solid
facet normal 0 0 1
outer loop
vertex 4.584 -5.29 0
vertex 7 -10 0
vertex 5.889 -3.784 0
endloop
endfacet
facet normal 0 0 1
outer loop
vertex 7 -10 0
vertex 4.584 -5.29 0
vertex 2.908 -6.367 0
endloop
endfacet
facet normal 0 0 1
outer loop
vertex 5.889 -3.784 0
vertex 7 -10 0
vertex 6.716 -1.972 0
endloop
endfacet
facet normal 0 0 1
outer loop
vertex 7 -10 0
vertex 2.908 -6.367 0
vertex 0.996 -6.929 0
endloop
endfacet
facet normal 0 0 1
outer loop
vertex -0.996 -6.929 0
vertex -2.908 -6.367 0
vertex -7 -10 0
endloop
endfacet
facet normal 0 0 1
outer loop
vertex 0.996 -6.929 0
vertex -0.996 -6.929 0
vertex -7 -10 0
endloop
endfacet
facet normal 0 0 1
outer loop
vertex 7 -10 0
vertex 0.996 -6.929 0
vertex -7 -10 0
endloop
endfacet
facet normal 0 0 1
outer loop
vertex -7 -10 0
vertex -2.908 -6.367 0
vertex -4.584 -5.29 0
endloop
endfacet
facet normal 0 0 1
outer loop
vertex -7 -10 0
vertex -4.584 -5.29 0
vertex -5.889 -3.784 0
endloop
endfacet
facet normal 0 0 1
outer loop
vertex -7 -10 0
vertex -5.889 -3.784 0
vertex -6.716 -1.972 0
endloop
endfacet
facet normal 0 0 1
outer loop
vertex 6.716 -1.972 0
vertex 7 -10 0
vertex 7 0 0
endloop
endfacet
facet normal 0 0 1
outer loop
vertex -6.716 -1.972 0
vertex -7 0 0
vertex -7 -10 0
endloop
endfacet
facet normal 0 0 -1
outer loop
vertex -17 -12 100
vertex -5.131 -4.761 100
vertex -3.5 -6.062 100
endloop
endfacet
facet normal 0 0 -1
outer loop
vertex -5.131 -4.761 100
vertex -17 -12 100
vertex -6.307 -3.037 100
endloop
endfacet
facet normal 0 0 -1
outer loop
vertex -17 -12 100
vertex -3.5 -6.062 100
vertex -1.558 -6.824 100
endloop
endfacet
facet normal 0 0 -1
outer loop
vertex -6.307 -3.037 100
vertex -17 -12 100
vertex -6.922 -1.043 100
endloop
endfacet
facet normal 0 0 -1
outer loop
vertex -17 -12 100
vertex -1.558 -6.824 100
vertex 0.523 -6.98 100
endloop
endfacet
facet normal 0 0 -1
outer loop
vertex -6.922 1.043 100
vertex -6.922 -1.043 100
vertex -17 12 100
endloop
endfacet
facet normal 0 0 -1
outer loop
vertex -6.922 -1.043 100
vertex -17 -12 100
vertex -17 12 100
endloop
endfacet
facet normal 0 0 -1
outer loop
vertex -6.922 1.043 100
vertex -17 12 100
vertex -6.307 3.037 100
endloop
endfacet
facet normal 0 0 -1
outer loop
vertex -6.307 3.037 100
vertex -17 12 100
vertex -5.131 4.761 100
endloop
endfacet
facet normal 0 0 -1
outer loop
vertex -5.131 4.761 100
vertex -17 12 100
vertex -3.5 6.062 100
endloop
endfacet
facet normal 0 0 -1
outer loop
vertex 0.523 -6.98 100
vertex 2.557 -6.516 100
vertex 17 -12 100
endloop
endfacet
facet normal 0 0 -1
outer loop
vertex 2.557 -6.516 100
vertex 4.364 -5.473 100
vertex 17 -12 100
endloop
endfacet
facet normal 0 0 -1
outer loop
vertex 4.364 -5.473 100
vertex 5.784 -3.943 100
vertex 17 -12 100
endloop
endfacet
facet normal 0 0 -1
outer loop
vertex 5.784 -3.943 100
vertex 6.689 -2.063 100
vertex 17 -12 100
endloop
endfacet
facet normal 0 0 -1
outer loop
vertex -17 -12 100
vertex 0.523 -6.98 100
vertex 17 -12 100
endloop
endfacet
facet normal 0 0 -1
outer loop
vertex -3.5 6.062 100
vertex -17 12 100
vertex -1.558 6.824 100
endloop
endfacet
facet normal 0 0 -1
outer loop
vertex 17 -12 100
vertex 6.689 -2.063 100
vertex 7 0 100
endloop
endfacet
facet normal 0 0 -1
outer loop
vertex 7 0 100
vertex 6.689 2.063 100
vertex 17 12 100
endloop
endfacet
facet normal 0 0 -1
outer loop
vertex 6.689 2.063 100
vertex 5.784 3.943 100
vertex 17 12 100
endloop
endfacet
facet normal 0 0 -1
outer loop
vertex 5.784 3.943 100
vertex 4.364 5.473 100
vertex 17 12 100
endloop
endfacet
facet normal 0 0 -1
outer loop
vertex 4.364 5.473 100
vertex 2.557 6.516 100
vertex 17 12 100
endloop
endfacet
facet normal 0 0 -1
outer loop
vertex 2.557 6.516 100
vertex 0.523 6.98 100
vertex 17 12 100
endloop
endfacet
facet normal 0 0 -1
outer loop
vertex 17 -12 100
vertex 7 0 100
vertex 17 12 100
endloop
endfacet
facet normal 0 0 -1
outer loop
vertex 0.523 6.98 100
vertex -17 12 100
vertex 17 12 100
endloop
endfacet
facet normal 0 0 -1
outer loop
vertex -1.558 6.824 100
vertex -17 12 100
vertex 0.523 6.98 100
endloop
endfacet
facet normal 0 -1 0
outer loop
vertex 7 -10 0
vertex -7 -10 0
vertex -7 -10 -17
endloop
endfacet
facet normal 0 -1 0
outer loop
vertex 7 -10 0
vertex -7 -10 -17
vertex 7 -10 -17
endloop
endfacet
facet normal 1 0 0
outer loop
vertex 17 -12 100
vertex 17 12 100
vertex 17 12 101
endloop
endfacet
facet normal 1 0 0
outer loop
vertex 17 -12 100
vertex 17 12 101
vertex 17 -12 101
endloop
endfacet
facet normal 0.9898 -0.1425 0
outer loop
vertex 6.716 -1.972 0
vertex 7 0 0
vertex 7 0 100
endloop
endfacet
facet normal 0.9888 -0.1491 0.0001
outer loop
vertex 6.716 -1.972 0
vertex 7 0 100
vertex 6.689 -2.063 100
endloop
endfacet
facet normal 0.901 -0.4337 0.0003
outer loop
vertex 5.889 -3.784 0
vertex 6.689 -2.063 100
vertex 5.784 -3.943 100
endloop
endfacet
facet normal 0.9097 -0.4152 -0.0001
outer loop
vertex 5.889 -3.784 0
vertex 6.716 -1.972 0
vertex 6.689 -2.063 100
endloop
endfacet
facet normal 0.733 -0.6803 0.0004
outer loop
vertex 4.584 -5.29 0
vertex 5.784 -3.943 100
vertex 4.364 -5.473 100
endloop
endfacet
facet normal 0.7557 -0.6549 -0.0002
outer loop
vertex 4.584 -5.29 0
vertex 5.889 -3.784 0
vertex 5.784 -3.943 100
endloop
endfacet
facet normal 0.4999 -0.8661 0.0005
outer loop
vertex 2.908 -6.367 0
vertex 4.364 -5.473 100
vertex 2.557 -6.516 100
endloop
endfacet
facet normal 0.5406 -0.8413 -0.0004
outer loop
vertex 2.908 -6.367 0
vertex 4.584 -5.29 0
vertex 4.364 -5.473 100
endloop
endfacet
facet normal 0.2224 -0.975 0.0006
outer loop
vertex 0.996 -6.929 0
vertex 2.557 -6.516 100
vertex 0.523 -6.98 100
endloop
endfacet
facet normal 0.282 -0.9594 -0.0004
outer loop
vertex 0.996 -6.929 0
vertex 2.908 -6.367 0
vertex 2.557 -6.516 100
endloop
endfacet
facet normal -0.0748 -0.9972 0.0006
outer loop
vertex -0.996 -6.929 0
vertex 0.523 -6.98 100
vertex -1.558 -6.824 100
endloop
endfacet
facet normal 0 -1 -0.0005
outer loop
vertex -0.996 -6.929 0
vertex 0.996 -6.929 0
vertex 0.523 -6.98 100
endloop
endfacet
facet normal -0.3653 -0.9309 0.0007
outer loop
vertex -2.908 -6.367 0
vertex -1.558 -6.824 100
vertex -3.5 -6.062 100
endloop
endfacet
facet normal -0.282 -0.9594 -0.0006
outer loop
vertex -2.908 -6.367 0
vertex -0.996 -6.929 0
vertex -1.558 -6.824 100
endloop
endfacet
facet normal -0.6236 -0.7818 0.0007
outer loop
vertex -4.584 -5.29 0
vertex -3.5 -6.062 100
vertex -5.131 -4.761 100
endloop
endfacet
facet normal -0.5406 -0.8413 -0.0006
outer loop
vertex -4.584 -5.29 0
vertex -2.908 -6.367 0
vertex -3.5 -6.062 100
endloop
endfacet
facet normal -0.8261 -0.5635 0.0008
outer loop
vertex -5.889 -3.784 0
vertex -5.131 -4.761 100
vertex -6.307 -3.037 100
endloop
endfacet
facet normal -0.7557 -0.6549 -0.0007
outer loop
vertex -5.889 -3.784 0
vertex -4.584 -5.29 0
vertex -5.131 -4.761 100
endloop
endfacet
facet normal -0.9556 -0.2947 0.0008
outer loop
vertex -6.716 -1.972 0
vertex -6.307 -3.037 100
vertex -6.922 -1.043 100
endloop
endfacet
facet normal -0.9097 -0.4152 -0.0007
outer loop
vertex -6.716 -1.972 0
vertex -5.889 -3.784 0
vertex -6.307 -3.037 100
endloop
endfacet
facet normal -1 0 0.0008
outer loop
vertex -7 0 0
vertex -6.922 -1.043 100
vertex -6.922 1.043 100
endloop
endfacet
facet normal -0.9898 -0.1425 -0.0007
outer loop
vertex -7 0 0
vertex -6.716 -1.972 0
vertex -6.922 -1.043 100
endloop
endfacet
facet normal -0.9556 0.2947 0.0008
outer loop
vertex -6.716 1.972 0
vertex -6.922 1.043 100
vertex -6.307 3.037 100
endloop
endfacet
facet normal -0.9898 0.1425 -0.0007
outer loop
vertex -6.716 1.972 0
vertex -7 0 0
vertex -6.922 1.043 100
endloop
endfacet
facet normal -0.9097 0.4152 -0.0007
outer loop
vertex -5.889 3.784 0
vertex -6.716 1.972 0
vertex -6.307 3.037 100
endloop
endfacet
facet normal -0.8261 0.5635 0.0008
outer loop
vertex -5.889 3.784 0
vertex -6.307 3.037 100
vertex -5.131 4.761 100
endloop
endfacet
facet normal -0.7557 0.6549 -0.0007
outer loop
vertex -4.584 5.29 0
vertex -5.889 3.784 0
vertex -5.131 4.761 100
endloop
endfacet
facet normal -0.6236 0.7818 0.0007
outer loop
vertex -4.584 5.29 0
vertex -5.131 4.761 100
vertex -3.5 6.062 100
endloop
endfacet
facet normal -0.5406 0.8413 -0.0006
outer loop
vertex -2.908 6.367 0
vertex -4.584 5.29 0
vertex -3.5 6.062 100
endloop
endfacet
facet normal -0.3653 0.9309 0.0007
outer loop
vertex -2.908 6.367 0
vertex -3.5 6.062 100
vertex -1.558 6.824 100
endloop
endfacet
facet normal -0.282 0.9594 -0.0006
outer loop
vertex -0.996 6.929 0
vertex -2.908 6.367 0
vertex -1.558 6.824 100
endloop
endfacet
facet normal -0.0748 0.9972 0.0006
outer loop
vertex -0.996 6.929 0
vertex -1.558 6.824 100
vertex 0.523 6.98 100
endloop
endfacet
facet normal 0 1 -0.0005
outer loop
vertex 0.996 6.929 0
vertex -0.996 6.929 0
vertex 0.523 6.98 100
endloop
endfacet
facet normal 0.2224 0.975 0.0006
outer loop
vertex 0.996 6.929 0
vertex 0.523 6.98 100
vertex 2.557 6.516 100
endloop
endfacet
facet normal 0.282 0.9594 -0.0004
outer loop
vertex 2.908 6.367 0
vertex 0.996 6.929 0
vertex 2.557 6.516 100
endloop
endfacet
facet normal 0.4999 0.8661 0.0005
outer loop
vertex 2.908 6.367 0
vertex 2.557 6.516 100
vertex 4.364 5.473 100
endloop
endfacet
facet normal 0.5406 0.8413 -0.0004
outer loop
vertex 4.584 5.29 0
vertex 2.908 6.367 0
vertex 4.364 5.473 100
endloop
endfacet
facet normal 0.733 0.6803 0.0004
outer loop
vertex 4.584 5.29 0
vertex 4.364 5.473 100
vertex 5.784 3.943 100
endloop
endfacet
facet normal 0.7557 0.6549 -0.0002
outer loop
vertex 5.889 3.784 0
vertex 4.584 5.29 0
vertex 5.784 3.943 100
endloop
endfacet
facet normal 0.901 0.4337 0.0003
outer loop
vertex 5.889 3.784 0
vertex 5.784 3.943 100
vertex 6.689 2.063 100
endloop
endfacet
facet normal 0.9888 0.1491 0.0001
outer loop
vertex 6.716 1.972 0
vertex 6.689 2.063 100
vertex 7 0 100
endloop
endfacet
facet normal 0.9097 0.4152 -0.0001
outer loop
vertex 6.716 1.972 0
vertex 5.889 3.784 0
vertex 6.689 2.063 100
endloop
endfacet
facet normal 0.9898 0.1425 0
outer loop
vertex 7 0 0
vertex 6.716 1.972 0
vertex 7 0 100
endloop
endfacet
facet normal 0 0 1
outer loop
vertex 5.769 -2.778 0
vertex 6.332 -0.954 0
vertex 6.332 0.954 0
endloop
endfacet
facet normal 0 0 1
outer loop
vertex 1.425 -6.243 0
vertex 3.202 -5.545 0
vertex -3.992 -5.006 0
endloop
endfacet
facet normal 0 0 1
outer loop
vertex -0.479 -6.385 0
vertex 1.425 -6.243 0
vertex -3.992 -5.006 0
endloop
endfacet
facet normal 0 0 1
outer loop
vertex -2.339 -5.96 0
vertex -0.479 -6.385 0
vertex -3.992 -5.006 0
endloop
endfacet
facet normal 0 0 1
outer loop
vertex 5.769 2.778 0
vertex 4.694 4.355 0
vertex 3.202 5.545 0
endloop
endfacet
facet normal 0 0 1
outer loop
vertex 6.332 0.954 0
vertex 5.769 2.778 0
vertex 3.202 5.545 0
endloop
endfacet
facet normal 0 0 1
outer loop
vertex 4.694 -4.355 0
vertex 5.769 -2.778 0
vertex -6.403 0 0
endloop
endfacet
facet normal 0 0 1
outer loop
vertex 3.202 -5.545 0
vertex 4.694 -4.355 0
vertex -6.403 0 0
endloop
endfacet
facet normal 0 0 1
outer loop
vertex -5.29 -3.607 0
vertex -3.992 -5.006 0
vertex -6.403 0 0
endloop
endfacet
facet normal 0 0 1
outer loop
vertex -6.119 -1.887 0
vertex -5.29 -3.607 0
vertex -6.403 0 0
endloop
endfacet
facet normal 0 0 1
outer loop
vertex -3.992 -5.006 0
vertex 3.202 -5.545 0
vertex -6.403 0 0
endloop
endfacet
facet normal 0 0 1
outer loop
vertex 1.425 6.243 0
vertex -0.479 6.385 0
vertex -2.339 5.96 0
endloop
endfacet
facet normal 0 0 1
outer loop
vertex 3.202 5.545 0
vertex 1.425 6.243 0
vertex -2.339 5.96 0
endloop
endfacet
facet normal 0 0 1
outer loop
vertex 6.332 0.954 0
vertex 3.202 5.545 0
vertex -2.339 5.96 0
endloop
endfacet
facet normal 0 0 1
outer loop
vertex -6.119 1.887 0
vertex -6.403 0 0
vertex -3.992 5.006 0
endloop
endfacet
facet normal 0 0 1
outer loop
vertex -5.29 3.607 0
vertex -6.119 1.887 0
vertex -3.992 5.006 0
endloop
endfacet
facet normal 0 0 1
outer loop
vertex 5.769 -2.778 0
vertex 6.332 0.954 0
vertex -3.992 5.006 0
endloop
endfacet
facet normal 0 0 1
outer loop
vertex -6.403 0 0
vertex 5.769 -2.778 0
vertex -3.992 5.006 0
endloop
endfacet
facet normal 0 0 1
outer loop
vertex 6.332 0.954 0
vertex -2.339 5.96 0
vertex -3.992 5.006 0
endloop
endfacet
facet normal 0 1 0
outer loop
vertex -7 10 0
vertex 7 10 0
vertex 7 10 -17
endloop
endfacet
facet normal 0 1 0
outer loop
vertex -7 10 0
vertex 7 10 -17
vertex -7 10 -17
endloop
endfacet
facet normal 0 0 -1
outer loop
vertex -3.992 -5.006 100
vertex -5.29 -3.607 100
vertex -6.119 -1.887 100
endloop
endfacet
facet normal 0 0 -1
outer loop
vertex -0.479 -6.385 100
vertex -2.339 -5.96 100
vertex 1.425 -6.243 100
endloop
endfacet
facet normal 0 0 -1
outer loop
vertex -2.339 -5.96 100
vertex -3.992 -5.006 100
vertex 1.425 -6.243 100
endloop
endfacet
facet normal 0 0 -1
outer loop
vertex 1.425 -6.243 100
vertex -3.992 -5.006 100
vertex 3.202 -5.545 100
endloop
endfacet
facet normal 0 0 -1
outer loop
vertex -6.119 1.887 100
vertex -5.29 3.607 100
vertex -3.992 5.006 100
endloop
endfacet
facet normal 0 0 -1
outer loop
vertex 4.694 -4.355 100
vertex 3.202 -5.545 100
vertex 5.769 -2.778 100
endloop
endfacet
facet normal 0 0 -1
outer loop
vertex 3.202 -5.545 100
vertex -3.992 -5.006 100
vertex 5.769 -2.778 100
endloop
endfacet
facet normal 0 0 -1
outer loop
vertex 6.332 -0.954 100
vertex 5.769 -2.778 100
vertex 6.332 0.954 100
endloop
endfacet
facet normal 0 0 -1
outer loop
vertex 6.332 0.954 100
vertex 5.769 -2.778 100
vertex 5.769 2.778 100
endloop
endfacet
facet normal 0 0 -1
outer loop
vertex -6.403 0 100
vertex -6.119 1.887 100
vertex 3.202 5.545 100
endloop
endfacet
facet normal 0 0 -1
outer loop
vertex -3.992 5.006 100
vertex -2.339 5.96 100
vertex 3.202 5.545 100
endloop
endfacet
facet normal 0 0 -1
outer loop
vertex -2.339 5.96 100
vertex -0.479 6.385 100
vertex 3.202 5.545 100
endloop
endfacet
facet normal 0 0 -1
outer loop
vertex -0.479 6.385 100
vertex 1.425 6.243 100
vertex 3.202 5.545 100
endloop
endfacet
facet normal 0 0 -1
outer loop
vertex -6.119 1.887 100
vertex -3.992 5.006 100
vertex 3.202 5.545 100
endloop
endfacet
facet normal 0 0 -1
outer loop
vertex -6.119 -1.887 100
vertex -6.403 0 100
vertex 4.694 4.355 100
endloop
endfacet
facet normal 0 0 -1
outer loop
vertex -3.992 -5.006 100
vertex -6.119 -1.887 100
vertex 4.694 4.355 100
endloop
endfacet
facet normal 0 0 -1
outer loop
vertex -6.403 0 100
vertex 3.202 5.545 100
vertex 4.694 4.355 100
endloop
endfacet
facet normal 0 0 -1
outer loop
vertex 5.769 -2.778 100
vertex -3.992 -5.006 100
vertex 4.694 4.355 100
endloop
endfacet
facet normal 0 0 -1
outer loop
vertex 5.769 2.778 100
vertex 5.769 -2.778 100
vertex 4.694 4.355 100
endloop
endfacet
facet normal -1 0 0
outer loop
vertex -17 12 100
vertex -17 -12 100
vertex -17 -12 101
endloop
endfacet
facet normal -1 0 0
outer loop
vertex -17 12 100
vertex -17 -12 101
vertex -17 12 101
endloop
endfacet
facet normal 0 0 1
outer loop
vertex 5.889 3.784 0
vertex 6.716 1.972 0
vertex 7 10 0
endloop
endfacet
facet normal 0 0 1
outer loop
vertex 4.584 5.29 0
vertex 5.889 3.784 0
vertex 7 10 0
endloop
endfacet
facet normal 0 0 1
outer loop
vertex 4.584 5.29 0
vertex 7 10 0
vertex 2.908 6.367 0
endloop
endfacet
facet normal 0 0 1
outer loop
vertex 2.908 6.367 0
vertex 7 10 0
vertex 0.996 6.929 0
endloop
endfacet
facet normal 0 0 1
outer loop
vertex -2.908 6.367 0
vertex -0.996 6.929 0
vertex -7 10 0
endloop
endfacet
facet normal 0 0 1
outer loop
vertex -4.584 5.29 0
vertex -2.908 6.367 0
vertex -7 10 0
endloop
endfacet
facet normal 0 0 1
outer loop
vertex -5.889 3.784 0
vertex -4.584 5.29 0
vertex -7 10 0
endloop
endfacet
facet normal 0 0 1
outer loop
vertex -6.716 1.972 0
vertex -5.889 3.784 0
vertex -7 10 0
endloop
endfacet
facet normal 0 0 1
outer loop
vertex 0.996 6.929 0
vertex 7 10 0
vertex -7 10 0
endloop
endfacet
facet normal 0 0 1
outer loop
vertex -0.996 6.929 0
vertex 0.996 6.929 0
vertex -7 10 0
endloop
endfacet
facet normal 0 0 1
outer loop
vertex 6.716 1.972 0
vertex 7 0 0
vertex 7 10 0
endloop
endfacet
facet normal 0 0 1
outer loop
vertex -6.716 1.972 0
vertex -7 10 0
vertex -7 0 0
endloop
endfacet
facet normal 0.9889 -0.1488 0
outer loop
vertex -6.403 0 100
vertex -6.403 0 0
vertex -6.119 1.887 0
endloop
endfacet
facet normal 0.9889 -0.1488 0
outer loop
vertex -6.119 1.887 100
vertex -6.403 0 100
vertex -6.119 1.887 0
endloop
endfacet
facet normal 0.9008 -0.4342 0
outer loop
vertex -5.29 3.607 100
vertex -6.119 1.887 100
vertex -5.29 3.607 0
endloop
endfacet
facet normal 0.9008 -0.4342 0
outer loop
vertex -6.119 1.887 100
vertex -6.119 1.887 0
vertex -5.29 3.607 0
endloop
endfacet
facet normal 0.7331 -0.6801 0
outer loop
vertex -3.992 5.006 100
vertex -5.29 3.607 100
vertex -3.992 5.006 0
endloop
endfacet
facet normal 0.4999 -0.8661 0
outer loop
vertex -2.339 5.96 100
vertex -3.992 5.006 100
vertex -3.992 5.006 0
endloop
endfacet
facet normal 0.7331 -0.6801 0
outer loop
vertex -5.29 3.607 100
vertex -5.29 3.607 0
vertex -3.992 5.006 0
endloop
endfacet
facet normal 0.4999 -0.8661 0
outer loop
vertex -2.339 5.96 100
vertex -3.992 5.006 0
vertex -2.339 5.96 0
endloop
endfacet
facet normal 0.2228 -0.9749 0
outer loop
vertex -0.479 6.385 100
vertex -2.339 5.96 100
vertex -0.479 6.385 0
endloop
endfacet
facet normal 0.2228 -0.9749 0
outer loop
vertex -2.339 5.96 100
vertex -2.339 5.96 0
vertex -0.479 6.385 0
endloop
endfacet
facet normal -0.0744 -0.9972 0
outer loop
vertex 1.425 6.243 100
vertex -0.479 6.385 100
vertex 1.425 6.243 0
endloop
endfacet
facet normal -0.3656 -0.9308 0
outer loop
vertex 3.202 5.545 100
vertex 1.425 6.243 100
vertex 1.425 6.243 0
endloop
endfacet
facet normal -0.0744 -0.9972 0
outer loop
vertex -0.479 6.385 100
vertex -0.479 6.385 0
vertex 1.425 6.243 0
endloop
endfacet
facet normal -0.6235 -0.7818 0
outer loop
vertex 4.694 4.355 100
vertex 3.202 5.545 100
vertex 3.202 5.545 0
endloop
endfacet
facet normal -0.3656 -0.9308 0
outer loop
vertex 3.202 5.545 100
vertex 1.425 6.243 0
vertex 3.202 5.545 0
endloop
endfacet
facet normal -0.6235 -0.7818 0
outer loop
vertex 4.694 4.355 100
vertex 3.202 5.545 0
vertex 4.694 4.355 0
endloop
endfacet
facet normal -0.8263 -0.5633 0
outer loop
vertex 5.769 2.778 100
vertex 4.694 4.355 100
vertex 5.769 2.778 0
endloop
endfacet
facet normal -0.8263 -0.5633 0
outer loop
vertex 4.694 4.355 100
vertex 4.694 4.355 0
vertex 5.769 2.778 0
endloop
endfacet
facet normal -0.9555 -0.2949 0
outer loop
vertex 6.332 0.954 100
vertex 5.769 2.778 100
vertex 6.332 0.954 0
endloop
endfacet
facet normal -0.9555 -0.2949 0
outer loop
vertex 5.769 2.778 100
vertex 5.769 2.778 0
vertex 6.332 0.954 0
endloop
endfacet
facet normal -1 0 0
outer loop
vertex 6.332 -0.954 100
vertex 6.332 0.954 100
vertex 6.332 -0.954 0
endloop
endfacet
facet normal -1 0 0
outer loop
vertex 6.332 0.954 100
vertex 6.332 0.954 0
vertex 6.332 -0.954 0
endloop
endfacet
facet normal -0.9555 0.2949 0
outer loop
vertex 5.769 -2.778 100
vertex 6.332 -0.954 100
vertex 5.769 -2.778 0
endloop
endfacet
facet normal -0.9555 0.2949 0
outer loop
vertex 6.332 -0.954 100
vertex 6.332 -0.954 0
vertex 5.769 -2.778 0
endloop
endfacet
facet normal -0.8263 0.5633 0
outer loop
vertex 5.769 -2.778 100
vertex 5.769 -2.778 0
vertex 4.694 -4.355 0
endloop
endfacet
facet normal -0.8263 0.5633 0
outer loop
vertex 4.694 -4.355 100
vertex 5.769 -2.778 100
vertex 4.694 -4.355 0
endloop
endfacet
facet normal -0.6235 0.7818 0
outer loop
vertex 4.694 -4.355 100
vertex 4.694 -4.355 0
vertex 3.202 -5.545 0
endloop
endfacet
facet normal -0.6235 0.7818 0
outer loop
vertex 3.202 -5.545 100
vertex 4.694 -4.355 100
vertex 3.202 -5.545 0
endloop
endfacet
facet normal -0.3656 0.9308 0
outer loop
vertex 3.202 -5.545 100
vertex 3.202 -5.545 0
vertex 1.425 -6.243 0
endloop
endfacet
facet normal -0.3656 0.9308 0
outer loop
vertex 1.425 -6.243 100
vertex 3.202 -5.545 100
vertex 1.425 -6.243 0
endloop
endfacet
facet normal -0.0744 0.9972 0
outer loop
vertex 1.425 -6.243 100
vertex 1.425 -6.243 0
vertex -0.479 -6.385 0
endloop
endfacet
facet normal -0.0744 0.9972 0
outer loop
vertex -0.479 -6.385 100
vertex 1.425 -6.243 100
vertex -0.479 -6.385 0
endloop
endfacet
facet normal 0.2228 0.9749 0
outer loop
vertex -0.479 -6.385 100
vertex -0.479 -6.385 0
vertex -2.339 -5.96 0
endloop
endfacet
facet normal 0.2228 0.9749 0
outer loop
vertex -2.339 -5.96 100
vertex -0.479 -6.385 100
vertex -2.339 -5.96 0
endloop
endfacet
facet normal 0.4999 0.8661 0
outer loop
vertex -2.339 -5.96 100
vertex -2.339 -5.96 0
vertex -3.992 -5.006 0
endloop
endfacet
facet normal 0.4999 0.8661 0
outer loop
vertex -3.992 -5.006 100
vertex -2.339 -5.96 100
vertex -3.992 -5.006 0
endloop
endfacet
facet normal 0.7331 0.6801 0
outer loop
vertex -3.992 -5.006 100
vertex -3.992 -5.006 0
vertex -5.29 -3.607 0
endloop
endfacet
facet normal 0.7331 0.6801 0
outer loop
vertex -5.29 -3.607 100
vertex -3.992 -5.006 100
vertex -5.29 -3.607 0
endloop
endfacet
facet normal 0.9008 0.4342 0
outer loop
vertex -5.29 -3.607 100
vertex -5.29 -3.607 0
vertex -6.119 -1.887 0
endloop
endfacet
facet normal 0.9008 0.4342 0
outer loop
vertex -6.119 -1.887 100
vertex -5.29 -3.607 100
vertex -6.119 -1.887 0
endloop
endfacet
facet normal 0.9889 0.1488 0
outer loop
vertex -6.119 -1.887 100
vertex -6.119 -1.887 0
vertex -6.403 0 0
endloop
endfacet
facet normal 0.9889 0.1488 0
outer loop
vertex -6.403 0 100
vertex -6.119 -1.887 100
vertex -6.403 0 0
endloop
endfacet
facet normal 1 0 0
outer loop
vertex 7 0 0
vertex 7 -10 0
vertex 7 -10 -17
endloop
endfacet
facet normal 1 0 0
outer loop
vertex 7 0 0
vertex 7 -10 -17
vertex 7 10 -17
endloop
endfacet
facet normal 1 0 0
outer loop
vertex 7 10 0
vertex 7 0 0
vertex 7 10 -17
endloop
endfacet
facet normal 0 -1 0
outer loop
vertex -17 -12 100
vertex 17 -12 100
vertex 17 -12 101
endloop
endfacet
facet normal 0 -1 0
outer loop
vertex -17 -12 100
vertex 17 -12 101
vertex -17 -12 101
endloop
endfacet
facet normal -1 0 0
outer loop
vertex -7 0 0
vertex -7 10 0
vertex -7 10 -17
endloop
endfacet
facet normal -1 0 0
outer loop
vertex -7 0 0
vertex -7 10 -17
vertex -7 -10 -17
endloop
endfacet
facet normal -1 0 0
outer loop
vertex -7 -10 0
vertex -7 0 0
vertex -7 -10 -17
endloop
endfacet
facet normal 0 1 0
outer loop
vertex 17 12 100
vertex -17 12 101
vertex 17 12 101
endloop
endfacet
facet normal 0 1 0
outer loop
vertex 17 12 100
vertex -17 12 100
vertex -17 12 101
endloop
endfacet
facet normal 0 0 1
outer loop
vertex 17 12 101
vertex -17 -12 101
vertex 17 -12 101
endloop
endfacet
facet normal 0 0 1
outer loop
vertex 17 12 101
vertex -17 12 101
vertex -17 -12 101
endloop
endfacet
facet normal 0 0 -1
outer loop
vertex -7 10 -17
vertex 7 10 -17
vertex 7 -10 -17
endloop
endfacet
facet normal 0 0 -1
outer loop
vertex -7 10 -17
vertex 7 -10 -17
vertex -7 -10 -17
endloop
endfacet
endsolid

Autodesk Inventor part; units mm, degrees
ref_plane "YZ Plane" through (0, 0, 0) normal (1, 0, 0) x (0, 1, 0)
ref_plane "XZ Plane" through (0, 0, 0) normal (0, 1, 0) x (-1, 0, 0)
ref_plane "XY Plane" through (0, 0, 0) normal (0, 0, 1) x (1, 0, 0)
sketch "Sketch1" plane through (0, 0, 0) normal (0, 0, 1) x (1, 0, 0)
  circle A0 centre (0, 0) radius 7
  dimension "d0" = 14
extrude "Extrusion1" add sketch "Sketch1" along normal blind 100
sketch "Sketch2" plane through (0, 0, 0) normal (0, 0, -1) x (-1, 0, 0)
  circle A0 centre (0, 0) radius 6.4031
extrude "Extrusion2" cut sketch "Sketch2" against normal blind 1000
sketch "Sketch3" plane through (0, 0, 100) normal (0, 0, 1) x (1, 0, 0)
  line L0 (17, -12) -> (-17, -12)
  line L1 (-17, -12) -> (-17, 12)
  line L2 (-17, 12) -> (17, 12)
  line L3 (17, 12) -> (17, -12)
  point P0 (0, 0)
  dimension "d5" = 34
  dimension "d6" = 24
extrude "Extrusion3" add sketch "Sketch3" along normal blind 1
sketch "Sketch4" plane through (0, 0, 0) normal (0, 0, -1) x (-1, 0, 0)
  line L0 (7, -10) -> (-7, -10)
  line L1 (-7, -10) -> (-7, 10)
  line L2 (-7, 10) -> (7, 10)
  line L3 (7, 10) -> (7, -10)
  point P0 (0, 0)
  dimension "d9" = 14
  dimension "d10" = 20
extrude "Extrusion4" add sketch "Sketch4" along normal blind 17
properties part number "muñeca eje"
